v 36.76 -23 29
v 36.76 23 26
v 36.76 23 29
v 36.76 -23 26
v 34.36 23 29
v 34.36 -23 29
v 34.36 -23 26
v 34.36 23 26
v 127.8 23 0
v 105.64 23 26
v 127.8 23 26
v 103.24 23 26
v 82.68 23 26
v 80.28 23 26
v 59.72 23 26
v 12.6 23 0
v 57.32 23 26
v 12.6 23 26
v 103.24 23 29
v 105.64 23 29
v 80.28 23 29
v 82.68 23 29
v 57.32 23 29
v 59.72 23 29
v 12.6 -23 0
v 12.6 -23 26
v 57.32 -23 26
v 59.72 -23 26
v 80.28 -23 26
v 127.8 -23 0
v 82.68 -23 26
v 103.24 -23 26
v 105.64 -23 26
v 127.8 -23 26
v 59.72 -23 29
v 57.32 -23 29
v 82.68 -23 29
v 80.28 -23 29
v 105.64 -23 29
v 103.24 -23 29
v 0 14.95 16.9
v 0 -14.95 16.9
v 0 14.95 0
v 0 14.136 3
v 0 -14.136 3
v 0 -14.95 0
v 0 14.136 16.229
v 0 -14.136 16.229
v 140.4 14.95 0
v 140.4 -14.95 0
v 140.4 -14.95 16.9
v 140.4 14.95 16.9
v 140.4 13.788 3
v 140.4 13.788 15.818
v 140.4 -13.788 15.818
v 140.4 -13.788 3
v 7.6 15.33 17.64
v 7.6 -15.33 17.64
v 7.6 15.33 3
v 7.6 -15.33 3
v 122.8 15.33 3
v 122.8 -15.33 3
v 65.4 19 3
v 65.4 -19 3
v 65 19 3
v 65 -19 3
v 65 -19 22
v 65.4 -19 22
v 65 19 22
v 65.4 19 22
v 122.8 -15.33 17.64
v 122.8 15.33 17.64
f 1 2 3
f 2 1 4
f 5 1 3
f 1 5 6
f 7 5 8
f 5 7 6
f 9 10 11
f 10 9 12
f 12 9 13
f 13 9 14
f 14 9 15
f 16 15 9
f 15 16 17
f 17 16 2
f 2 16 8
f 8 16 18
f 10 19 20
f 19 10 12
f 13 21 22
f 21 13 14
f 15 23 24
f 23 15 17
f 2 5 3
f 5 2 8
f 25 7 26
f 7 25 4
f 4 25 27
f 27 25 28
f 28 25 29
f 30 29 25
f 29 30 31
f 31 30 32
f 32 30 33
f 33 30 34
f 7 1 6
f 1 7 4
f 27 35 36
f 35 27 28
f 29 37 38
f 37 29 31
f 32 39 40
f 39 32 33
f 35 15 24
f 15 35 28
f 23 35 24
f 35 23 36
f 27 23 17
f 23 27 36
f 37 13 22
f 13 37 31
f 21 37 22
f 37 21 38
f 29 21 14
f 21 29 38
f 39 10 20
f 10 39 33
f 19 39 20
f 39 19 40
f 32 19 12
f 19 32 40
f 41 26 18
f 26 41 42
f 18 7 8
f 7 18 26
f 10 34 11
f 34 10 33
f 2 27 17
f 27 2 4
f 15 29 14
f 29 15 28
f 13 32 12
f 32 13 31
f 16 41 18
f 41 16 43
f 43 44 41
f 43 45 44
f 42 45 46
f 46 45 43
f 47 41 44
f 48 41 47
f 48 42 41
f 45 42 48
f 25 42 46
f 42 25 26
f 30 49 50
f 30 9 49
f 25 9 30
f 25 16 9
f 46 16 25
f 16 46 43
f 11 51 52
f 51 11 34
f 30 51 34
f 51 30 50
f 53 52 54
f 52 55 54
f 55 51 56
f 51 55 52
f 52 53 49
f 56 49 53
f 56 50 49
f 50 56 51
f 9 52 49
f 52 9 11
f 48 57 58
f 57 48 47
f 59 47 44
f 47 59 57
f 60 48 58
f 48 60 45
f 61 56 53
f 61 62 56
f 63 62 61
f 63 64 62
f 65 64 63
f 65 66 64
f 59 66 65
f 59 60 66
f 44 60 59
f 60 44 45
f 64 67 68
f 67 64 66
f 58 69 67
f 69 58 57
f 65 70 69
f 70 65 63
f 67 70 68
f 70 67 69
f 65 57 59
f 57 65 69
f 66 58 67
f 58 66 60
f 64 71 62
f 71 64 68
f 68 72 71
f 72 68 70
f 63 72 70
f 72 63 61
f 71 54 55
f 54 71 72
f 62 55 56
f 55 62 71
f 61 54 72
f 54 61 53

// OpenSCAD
$fn = 32;

// ----------------------------------------------------------------------
// Faired channel: 140 x 46 x 26 mm, 4 mm walls, faired ends
// ----------------------------------------------------------------------

// --- parameters (mm) ---
length = 140;             // channel length
width = 46;               // channel width at mid length
height = 26;              // channel height at mid length
wall = 4;                 // side wall thickness
floor_t = 3;              // floor thickness
end_w = 29.9;             // faired end width
end_h = 16.9;             // faired end height
ribs = 4;                 // stiffening ribs on the top
rib_t = 2.4;              // rib thickness
rib_h = 3;                // rib height

difference() {
  union() {
    hull() {
      translate([0, -14.95, 0]) cube([0.4, 29.9, 16.9]);
      translate([12.6, -23, 0]) cube([0.4, 46, 26]);
    }
    hull() {
      translate([12.6, -23, 0]) cube([0.4, 46, 26]);
      translate([70, -23, 0]) cube([0.4, 46, 26]);
    }
    hull() {
      translate([70, -23, 0]) cube([0.4, 46, 26]);
      translate([127.4, -23, 0]) cube([0.4, 46, 26]);
    }
    hull() {
      translate([127.4, -23, 0]) cube([0.4, 46, 26]);
      translate([140, -14.95, 0]) cube([0.4, 29.9, 16.9]);
    }
    /* stiffening ribs across the flat top, sunk 0.8 mm into it */
    for (i = [1 : ribs]) {
      translate([12.6 + i * (length - 2 * 12.6) / (ribs + 1) - rib_t / 2, -width / 2, height - 0.8]) cube([rib_t, width, rib_h + 0.8]);
    }
  }
  /* cavity, 5 mm proud of both ends so the ports are cut clean */
  hull() {
    translate([-5, -13.35, 3]) cube([0.4, 26.7, 12.3]);
    translate([7.6, -15.33, 3]) cube([0.4, 30.66, 14.64]);
  }
  hull() {
    translate([7.6, -15.33, 3]) cube([0.4, 30.66, 14.64]);
    translate([65, -19, 3]) cube([0.4, 38, 19]);
  }
  hull() {
    translate([65, -19, 3]) cube([0.4, 38, 19]);
    translate([122.4, -15.33, 3]) cube([0.4, 30.66, 14.64]);
  }
  hull() {
    translate([122.4, -15.33, 3]) cube([0.4, 30.66, 14.64]);
    translate([145, -13.35, 3]) cube([0.4, 26.7, 12.3]);
  }
}
